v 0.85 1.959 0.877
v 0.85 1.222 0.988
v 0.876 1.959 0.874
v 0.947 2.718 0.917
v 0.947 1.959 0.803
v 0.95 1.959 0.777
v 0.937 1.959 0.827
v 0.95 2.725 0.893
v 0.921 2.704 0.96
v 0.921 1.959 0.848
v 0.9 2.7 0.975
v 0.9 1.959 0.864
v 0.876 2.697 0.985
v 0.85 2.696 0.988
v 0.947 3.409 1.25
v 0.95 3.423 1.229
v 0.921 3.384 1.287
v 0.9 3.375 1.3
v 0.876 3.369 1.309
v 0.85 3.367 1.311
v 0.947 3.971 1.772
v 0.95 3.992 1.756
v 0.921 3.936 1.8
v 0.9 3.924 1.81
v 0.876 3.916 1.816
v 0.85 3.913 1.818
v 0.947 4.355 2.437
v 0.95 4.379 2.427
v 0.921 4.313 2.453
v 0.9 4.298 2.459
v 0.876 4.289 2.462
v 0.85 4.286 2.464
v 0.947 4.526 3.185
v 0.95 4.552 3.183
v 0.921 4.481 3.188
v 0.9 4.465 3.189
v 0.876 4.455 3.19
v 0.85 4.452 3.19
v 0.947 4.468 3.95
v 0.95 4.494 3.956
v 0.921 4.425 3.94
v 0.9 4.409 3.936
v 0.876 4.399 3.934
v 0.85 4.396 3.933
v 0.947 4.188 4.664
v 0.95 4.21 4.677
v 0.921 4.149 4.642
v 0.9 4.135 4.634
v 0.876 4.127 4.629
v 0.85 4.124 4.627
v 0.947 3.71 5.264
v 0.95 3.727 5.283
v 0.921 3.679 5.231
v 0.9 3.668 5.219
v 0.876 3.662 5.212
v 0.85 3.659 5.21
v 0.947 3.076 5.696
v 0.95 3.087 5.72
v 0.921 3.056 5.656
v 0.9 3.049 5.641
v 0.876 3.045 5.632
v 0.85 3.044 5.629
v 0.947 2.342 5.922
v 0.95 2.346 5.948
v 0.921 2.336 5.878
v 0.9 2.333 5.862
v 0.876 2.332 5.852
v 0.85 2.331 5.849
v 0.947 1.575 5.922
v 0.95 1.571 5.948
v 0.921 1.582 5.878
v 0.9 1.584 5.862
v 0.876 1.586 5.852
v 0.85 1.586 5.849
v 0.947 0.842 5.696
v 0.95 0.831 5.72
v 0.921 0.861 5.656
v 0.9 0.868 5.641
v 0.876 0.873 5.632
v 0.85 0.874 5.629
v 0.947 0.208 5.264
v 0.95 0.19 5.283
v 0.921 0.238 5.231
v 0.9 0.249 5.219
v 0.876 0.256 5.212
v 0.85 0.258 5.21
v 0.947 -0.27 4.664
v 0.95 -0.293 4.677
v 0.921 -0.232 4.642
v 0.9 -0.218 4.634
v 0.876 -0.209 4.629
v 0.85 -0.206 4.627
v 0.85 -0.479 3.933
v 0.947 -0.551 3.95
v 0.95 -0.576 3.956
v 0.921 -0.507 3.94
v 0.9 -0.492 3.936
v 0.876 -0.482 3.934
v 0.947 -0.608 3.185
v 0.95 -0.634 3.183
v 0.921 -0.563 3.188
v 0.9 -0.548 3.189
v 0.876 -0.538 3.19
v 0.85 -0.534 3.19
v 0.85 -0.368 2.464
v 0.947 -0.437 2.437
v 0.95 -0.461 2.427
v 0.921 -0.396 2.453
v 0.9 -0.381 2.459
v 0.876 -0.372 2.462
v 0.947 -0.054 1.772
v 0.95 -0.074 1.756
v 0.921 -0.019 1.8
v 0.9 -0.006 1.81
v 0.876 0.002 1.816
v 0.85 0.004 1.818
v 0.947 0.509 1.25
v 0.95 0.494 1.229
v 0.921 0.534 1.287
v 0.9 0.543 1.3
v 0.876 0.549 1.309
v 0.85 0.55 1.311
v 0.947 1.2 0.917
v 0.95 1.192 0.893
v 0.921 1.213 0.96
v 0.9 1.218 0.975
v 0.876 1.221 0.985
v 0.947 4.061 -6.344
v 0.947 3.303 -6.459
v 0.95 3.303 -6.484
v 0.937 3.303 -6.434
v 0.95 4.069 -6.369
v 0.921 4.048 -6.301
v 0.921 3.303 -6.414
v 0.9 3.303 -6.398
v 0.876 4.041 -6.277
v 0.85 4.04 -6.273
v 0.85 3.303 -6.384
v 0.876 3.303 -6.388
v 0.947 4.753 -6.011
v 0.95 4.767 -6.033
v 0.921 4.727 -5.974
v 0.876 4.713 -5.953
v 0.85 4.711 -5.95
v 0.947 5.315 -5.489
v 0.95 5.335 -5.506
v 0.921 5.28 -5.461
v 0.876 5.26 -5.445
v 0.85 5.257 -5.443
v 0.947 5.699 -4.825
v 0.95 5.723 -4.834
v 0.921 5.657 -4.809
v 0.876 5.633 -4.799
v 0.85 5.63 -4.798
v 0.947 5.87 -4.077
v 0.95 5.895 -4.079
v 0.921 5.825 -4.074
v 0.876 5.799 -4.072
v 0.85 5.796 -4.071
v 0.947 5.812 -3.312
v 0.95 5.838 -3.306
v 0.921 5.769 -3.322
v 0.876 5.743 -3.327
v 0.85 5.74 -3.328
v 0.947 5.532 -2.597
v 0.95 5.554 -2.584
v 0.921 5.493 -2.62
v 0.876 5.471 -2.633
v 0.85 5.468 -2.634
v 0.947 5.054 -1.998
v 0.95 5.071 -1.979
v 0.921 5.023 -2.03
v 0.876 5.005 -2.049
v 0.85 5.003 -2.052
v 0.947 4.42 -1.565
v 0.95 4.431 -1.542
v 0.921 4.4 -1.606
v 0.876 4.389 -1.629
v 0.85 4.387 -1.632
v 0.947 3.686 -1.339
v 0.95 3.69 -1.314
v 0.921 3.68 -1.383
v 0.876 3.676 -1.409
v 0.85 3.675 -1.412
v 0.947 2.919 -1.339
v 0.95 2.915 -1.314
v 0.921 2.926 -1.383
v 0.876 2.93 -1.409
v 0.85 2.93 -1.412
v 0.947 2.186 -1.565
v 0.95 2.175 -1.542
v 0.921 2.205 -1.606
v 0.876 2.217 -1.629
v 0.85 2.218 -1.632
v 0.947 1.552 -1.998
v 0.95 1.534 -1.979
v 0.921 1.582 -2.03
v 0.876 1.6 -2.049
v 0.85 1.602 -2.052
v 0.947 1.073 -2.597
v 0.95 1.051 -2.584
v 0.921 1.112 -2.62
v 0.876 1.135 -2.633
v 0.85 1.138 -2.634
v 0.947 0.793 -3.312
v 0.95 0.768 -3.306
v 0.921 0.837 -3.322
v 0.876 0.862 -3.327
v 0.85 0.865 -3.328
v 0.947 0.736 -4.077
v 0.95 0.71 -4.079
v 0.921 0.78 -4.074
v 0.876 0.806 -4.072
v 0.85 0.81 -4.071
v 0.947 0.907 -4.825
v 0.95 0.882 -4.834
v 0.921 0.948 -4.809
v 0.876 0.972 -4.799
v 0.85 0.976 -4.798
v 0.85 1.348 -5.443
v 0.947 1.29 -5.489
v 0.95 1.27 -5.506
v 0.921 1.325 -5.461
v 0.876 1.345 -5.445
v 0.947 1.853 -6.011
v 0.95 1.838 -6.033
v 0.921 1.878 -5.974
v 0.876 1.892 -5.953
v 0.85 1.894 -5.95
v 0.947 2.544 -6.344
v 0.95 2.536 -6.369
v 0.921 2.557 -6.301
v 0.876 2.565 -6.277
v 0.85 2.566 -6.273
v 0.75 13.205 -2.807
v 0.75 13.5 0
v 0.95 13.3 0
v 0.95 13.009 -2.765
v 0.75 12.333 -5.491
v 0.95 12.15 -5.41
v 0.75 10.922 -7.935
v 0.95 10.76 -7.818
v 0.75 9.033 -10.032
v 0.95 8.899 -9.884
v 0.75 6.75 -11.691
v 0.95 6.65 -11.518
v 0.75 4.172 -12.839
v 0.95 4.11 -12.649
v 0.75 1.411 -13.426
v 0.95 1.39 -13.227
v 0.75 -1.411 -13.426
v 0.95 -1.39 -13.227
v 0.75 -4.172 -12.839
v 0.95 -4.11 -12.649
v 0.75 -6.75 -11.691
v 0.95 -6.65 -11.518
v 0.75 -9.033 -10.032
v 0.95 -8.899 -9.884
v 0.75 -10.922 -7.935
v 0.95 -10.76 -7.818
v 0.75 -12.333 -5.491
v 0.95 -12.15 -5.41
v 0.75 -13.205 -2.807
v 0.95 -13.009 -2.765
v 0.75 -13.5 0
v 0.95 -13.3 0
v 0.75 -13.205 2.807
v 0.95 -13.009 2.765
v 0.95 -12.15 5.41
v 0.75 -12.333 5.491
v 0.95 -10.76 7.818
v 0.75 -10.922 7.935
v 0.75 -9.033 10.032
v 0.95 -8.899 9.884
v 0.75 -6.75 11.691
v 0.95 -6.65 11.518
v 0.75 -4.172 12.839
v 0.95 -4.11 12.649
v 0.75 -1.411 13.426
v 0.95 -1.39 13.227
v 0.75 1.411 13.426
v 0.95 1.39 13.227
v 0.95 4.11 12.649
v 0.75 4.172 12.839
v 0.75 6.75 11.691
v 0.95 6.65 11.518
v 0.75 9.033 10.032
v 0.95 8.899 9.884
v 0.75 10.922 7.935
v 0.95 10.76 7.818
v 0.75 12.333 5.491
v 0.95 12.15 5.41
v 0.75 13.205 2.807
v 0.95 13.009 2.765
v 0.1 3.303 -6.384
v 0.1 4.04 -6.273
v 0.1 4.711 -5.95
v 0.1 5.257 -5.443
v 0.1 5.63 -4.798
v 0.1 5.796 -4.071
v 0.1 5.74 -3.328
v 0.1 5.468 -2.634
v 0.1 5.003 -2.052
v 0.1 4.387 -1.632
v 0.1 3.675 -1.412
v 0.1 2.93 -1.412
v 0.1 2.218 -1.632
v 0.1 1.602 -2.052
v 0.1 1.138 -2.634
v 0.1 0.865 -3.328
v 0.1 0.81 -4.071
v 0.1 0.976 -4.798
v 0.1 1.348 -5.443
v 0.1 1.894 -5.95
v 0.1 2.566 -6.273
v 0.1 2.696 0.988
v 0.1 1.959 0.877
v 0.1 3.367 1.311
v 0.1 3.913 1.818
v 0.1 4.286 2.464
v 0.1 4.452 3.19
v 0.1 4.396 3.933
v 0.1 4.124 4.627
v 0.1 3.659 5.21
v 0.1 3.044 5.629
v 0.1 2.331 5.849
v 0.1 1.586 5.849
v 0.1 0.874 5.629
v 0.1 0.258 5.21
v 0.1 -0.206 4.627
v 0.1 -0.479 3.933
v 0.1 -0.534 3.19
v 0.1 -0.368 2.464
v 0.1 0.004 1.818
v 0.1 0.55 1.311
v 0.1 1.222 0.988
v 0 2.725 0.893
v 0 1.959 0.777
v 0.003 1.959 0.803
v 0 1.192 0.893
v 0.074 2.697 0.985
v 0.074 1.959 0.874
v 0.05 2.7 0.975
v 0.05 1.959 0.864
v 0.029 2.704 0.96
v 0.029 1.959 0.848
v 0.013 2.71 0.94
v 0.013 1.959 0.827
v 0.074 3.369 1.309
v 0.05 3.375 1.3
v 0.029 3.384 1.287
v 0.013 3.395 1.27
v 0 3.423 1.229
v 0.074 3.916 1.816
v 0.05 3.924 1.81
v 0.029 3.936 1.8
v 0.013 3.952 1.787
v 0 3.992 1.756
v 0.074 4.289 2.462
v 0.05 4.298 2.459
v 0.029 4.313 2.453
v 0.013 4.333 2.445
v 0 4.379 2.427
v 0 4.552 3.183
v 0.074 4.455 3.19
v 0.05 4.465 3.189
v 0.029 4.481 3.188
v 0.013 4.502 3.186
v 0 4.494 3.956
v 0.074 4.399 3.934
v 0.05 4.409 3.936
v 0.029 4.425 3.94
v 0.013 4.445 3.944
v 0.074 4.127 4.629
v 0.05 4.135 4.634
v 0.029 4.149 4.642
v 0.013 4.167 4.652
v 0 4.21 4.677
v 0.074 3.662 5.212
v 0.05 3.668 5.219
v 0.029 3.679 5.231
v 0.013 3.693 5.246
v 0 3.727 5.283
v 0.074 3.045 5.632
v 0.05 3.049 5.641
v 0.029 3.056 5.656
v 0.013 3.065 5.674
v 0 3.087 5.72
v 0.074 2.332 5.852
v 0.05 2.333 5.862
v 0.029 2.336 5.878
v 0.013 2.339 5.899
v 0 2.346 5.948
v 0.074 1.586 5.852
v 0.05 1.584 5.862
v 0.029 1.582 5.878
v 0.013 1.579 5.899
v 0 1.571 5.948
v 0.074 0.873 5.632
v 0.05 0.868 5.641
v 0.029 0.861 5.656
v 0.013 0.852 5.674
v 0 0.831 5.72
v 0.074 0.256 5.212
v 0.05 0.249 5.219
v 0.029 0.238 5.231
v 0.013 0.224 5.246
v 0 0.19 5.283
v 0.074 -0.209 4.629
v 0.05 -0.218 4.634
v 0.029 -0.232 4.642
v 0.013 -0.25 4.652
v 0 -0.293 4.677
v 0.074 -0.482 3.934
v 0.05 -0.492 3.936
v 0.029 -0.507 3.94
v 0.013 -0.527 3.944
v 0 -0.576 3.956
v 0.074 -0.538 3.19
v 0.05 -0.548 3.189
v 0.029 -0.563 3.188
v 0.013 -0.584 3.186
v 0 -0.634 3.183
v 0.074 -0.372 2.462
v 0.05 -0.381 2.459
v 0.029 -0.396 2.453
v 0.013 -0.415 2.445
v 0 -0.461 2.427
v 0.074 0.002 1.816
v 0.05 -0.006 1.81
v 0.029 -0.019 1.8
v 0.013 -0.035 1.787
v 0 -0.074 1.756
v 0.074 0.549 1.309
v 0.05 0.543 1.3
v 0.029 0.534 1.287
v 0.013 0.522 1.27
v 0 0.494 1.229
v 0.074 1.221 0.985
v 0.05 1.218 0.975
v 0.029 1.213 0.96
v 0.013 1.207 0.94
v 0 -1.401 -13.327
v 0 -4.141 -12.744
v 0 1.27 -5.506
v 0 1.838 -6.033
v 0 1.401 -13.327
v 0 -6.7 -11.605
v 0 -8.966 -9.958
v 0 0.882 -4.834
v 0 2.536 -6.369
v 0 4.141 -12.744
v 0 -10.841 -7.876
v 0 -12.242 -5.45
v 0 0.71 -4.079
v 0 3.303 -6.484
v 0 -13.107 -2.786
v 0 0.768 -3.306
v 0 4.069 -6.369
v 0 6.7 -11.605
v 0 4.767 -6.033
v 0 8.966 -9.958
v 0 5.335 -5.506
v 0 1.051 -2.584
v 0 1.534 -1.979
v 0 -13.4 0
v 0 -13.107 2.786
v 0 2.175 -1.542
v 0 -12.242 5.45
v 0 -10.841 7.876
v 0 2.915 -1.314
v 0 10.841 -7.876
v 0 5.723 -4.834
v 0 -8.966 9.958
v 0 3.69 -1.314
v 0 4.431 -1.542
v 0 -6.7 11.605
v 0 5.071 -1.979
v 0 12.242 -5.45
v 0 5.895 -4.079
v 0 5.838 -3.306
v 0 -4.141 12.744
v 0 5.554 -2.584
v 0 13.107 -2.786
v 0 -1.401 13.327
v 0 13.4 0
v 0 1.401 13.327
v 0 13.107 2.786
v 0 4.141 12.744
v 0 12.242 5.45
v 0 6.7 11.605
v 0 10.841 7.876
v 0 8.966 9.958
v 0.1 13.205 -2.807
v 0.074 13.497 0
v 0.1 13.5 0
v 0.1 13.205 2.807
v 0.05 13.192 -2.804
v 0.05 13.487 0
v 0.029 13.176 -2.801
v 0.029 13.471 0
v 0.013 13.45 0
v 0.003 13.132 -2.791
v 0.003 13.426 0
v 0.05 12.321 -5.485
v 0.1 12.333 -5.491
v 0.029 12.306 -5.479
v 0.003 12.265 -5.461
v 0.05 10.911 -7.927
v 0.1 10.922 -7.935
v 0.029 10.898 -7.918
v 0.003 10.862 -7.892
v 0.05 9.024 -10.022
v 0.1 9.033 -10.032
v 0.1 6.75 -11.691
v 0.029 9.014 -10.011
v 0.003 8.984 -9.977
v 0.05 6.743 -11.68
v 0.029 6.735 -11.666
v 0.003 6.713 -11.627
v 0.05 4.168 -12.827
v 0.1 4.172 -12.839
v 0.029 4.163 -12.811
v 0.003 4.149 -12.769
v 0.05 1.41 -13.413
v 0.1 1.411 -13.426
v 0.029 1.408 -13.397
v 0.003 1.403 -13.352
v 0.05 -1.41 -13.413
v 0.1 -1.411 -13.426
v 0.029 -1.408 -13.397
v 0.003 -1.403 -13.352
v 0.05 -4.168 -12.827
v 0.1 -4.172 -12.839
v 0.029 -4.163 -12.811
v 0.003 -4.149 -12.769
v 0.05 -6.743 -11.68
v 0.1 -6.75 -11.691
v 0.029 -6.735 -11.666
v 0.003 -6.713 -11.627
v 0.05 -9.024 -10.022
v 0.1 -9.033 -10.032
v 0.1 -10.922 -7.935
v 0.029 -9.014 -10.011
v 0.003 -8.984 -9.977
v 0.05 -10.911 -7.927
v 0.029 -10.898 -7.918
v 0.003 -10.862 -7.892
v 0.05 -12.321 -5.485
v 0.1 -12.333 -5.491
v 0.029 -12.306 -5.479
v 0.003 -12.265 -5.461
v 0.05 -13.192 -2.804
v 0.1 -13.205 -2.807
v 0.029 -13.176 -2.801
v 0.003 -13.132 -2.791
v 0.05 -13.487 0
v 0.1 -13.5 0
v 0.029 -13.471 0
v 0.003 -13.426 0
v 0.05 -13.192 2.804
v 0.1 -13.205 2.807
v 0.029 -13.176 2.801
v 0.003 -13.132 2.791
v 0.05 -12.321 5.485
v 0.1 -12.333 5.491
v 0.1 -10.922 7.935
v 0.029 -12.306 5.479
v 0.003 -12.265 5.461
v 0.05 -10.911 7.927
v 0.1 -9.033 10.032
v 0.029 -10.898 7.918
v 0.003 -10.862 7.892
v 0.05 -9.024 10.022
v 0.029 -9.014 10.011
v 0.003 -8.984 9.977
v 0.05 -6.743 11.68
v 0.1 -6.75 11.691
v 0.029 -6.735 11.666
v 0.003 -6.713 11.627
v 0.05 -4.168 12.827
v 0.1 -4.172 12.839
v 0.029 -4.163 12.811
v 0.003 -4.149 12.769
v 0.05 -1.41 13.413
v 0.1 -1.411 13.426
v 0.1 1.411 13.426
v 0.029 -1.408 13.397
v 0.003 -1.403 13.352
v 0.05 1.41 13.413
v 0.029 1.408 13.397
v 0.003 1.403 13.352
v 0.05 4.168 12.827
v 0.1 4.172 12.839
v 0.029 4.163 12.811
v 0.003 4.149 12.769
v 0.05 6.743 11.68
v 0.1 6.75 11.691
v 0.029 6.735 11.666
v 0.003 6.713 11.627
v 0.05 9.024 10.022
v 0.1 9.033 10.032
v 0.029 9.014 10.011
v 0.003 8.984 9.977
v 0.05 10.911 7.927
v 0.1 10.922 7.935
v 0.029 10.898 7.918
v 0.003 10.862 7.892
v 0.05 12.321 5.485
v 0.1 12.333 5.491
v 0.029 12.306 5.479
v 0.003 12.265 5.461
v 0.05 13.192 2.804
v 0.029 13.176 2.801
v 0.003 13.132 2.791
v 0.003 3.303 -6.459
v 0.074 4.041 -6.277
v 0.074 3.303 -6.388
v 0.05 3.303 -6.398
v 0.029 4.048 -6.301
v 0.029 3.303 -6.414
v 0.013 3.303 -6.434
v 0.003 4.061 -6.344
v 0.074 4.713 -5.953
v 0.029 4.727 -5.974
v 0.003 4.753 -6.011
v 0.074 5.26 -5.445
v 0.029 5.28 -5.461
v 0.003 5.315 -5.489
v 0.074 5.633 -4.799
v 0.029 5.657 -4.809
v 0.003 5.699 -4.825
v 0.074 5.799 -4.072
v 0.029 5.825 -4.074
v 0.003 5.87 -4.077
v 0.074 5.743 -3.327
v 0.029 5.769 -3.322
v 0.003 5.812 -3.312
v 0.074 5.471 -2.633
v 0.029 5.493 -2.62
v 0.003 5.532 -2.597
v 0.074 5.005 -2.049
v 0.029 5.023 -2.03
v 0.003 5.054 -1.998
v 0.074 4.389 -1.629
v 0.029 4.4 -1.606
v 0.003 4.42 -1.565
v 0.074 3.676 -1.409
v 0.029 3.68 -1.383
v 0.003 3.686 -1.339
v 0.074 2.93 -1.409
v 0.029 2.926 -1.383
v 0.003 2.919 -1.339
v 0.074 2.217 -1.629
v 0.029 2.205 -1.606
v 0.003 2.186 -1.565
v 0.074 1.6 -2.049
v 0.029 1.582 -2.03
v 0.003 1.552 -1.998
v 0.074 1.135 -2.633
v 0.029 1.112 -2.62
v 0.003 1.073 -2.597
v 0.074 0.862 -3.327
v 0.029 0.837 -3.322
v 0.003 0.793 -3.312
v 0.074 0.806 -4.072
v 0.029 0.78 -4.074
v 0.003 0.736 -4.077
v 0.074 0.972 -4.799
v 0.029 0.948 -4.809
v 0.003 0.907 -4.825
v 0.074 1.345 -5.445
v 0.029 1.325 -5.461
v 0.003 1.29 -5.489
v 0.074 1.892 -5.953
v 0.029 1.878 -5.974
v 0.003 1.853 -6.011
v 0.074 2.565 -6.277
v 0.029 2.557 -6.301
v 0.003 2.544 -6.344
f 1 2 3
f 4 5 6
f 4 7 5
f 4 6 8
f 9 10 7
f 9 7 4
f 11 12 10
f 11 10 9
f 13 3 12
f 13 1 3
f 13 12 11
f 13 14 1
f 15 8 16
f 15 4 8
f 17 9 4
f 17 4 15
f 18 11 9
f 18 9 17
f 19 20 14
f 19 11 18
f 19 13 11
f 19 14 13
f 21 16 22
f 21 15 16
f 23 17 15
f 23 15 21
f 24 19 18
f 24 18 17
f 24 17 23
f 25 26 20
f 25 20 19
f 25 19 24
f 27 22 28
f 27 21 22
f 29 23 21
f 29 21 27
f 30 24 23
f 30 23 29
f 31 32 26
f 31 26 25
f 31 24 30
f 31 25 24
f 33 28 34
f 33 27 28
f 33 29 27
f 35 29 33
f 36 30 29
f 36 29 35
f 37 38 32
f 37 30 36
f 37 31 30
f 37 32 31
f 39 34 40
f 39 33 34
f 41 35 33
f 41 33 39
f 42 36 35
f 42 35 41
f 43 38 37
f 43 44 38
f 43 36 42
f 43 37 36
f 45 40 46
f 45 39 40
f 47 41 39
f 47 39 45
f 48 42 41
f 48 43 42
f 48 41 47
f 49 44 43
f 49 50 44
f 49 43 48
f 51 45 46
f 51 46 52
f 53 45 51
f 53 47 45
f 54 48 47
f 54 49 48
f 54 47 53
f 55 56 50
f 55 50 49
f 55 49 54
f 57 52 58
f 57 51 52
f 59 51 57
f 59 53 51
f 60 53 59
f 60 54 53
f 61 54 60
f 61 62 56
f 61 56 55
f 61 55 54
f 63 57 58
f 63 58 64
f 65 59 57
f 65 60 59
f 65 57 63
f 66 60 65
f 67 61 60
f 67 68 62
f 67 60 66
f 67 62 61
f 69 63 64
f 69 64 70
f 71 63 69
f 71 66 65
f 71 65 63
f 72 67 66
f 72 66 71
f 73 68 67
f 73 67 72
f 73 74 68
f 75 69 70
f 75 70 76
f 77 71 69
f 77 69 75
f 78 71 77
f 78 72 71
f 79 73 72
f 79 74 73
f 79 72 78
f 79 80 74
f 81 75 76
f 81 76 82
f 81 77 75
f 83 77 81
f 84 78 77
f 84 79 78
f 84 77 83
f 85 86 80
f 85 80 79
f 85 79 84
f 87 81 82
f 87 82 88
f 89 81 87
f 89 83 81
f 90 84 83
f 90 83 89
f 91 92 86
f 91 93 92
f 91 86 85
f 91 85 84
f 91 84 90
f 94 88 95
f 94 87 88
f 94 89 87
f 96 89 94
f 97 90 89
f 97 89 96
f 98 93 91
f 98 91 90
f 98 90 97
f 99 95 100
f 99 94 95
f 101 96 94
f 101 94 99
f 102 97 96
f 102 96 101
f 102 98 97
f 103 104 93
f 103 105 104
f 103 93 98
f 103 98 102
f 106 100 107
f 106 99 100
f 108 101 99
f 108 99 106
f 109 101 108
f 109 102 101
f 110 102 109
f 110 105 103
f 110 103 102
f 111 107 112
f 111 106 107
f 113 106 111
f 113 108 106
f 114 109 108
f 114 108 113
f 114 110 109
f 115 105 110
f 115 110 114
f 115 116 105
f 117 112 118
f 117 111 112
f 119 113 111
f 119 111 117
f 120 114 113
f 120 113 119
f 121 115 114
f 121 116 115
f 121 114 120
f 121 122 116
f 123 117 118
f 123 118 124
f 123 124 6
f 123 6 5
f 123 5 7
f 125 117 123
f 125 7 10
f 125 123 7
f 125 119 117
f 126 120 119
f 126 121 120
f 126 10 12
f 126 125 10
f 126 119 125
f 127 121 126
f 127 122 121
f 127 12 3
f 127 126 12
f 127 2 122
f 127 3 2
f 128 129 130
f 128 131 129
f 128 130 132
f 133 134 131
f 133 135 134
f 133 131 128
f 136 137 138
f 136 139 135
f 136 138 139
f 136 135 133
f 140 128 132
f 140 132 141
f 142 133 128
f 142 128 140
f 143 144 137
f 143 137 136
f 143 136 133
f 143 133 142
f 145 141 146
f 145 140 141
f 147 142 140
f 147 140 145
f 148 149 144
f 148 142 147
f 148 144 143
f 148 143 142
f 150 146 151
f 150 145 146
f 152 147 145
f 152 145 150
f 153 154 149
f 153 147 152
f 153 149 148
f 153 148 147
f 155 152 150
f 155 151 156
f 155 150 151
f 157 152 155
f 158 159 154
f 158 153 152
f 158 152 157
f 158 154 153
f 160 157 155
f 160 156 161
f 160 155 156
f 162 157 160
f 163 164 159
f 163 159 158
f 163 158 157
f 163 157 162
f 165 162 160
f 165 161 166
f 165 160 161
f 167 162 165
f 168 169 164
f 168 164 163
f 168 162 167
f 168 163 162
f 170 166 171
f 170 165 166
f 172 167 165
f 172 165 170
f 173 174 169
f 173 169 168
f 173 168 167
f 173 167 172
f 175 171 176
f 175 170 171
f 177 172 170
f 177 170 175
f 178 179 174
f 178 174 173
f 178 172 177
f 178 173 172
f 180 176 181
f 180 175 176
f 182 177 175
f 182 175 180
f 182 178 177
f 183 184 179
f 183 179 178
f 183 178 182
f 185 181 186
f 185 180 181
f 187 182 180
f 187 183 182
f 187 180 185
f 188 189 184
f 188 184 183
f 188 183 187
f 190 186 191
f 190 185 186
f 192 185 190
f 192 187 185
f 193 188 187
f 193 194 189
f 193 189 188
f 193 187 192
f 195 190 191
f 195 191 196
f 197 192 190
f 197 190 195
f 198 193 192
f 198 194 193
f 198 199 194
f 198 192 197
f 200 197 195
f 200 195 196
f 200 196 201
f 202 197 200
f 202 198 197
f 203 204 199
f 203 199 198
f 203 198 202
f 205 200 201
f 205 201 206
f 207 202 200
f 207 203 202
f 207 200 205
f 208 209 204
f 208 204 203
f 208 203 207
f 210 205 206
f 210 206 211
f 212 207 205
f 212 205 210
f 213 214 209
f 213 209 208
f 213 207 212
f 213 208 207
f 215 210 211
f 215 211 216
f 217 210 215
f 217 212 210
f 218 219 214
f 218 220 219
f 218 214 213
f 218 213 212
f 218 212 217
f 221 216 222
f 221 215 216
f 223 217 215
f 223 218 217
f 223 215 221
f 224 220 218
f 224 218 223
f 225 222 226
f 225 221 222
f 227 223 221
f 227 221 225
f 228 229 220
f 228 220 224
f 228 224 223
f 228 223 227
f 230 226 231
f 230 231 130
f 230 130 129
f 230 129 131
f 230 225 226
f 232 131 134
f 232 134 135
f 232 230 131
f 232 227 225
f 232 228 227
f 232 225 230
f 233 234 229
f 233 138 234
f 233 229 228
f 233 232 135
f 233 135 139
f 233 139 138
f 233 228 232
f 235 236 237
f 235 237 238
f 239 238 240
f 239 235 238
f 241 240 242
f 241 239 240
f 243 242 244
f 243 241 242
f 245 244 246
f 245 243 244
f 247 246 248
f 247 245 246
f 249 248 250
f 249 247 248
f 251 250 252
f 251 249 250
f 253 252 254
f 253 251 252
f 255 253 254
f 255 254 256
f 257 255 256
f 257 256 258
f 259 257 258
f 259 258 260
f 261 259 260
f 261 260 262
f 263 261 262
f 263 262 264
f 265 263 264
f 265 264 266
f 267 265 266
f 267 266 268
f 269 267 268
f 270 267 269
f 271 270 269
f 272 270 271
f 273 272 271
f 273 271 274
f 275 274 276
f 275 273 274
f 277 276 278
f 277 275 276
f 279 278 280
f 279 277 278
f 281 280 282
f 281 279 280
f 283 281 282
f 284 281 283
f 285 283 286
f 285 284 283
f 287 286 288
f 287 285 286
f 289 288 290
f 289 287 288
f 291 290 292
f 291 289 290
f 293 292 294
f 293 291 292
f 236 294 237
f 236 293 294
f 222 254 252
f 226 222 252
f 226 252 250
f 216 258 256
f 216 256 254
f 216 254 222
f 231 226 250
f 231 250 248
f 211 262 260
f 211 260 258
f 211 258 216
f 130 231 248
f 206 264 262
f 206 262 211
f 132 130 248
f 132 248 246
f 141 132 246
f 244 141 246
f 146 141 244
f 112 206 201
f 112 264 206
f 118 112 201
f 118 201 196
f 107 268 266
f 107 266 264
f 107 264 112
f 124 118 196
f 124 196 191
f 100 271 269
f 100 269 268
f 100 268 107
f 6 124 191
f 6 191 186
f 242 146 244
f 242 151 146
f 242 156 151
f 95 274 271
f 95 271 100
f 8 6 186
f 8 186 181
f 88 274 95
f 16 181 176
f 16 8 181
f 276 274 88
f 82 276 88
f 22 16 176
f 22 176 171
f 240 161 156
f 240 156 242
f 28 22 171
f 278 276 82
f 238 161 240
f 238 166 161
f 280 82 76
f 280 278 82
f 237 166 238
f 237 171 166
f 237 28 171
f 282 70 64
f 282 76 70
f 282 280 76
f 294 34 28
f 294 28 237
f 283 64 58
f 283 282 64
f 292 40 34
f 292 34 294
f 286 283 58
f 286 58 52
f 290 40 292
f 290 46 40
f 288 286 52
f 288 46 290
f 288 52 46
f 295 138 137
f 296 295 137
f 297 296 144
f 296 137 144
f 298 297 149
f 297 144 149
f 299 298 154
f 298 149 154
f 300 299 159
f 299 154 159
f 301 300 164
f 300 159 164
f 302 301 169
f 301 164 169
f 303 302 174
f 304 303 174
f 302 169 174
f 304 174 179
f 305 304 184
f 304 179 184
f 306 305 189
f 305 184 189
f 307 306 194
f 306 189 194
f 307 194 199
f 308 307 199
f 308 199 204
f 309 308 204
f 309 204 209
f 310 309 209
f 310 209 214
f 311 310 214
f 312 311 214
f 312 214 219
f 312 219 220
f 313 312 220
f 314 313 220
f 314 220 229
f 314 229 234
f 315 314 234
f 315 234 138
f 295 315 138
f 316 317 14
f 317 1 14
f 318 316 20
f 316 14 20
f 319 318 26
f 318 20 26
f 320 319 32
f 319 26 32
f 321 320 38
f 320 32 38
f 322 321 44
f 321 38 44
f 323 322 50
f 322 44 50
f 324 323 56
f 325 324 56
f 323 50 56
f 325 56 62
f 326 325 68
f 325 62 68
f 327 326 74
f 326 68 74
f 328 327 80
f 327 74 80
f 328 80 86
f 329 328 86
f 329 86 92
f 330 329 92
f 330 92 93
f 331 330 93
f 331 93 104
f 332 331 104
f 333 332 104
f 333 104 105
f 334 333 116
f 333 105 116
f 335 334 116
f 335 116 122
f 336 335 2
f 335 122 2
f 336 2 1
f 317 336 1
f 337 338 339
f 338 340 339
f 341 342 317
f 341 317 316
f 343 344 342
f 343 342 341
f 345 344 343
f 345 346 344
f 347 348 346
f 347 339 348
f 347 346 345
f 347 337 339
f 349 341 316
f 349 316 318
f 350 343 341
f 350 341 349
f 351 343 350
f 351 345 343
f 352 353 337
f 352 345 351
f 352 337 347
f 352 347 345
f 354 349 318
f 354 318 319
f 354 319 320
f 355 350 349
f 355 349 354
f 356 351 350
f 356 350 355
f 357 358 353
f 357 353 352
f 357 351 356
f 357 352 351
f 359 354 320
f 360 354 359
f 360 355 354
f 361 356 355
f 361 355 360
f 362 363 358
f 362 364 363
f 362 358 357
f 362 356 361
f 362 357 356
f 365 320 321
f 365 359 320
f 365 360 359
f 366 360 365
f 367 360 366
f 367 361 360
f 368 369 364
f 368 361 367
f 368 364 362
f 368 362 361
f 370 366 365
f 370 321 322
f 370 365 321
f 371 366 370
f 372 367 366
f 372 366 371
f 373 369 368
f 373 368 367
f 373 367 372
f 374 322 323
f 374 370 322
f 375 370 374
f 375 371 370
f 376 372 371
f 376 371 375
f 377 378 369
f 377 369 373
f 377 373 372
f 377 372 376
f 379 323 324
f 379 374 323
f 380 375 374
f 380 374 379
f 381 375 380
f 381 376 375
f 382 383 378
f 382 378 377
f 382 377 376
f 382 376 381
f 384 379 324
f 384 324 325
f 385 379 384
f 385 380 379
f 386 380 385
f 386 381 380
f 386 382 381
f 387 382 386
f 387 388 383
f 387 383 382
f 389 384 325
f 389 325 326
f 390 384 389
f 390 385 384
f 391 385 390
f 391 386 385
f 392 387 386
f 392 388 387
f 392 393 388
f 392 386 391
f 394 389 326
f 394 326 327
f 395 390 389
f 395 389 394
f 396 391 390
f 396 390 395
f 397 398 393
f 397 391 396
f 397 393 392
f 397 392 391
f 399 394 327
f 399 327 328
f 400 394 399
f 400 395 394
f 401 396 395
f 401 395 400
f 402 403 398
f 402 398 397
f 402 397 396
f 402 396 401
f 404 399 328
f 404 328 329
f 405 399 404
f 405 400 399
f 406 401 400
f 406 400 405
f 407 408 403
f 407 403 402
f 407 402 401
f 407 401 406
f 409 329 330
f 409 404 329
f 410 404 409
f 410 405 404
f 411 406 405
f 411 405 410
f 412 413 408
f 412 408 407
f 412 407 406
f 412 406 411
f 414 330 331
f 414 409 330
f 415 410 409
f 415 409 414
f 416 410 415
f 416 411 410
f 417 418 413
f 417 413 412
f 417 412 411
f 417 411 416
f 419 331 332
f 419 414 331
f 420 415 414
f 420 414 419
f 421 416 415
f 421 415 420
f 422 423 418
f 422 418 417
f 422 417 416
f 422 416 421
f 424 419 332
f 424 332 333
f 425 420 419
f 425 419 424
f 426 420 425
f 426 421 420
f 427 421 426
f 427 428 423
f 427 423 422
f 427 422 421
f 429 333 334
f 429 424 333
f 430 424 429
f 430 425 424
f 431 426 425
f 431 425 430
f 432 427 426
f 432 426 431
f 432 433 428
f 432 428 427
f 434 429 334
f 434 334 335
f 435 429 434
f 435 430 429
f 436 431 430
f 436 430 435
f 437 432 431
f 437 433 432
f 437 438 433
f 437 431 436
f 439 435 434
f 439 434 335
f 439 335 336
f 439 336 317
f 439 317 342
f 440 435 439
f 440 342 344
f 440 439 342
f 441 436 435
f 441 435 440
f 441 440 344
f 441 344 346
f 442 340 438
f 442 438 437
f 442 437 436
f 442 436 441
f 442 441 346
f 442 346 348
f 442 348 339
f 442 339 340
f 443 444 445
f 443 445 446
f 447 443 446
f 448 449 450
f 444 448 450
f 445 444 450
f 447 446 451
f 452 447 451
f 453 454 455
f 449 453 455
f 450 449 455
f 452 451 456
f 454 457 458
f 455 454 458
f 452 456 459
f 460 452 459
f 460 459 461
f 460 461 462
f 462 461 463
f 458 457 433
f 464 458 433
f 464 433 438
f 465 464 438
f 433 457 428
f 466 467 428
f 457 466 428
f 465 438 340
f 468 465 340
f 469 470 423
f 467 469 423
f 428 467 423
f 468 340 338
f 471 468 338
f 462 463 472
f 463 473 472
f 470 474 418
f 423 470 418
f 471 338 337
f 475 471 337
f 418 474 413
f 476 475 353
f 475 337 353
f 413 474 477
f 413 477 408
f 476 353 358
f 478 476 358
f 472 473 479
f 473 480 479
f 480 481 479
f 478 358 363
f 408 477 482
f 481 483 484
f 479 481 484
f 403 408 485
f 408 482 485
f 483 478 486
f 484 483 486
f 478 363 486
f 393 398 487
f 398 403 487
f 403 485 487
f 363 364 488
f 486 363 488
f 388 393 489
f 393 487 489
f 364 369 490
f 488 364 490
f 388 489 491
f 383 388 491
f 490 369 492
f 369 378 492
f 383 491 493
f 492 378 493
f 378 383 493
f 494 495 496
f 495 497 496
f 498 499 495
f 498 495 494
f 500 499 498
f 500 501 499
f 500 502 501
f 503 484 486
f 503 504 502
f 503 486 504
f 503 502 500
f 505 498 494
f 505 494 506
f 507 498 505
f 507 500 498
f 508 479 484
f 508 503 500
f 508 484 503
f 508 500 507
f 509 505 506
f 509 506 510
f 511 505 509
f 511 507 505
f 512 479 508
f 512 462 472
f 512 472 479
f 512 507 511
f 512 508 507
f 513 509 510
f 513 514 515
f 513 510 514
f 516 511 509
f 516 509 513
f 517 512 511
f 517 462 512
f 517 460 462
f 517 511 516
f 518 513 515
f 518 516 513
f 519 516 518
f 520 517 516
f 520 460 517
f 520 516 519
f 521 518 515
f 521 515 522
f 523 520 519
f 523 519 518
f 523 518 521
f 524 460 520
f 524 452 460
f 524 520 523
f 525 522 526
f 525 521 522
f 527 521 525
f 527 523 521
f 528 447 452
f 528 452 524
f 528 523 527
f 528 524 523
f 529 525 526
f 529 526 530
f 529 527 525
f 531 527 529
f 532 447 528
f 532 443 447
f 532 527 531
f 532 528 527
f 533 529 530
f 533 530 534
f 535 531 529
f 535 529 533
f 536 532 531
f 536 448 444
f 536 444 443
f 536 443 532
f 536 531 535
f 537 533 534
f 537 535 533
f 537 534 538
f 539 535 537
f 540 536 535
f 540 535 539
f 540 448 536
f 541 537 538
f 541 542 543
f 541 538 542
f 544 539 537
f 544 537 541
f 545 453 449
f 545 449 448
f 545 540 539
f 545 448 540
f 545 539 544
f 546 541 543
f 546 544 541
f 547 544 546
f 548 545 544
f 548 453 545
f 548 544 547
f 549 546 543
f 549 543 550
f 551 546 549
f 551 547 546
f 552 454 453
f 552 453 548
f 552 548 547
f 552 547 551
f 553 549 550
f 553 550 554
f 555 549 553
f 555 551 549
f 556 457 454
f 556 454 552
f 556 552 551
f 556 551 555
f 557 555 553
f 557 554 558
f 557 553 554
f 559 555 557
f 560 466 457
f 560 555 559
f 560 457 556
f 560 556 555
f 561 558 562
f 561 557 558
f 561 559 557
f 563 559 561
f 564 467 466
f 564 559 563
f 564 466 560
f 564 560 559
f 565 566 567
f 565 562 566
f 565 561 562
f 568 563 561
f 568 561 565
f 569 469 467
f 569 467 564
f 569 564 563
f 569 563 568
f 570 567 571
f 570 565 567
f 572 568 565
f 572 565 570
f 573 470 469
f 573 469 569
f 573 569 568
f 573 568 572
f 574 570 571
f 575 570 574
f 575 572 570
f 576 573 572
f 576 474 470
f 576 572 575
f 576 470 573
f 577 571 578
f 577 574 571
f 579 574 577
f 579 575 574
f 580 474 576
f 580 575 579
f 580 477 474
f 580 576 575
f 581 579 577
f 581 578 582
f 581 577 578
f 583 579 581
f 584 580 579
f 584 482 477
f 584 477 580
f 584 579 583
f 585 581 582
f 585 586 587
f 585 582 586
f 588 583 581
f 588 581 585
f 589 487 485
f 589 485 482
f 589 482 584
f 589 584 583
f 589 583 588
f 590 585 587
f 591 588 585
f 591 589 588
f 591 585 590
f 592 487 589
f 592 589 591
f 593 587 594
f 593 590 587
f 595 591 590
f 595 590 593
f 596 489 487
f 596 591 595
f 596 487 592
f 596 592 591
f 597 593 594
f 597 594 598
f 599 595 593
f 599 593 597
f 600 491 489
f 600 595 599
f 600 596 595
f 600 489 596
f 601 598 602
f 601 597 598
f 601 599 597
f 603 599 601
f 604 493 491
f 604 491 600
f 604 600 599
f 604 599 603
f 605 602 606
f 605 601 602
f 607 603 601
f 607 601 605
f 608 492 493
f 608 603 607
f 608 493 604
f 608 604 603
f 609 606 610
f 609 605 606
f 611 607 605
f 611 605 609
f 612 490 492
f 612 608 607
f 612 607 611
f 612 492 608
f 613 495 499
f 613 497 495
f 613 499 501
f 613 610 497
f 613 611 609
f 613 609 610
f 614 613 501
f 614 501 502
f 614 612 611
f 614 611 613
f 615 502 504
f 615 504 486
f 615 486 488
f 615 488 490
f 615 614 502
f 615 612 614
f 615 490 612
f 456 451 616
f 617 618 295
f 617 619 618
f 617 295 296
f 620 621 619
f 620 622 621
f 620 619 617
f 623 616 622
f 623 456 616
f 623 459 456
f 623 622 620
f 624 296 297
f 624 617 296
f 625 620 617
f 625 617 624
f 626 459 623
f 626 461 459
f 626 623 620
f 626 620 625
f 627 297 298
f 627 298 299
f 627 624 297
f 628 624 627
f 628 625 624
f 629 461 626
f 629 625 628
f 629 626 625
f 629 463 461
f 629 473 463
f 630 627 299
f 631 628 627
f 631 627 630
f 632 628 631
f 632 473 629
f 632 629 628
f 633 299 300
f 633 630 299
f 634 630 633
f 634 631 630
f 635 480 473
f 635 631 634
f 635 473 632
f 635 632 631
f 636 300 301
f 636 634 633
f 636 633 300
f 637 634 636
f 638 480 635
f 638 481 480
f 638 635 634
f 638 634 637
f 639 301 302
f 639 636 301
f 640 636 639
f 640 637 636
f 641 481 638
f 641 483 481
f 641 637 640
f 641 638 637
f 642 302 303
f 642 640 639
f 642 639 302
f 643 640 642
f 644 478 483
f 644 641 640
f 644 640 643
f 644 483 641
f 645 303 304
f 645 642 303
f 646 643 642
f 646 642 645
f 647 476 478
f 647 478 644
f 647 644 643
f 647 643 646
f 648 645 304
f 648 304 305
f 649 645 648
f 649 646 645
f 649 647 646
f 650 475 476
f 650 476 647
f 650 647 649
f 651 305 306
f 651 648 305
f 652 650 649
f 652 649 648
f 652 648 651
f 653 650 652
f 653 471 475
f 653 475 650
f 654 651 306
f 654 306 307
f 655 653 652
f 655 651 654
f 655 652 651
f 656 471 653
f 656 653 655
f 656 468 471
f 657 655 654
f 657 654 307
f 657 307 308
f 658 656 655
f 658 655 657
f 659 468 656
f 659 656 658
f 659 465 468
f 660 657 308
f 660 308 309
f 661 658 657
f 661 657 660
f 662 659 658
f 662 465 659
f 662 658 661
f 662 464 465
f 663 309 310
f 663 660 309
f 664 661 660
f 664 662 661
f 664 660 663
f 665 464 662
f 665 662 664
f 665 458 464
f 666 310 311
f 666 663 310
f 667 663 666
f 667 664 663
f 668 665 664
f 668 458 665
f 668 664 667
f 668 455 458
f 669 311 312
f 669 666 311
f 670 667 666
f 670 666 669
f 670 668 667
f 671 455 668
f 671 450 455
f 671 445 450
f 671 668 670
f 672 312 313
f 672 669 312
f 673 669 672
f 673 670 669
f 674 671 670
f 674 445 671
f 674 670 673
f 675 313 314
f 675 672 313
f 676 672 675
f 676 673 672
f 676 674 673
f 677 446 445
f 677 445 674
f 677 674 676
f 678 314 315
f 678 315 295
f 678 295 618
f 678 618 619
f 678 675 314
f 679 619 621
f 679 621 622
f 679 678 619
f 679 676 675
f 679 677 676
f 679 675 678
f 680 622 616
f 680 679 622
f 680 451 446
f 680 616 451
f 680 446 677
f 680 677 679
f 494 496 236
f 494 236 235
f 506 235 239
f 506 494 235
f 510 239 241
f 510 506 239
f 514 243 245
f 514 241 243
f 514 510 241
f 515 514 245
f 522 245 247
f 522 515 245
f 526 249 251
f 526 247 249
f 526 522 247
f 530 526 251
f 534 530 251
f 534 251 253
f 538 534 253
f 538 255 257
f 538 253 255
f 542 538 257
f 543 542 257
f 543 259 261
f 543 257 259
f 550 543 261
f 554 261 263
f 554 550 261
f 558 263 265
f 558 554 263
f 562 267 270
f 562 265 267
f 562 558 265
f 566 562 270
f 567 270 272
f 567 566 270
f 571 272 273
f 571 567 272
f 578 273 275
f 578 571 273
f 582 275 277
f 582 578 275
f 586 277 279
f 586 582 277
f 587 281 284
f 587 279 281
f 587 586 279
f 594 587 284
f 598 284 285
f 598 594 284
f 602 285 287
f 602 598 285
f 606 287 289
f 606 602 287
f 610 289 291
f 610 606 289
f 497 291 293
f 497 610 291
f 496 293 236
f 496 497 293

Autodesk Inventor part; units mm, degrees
ref_plane "YZ Plane" through (0, 0, 0) normal (1, 0, 0) x (0, 1, 0)
ref_plane "XZ Plane" through (0, 0, 0) normal (0, 1, 0) x (-1, 0, 0)
ref_plane "XY Plane" through (0, 0, 0) normal (0, 0, 1) x (1, 0, 0)
sketch "Sketch1" plane through (0, 0, 0) normal (1, 0, 0) x (0, 1, 0)
  circle A0 centre (1.9588, 3.377) radius 2.2698
  circle A1 centre (1.9588, 3.377) radius 2.2698
  line L0 (1.9588, 3.377) -> (1.9588, 0)
  line L1 (1.9588, 0) -> (0, 0)
  line L2 (0, 0) -> (0, 3.377)
  line L3 (0, 3.377) -> (1.9588, 3.377)
  circle A2 centre (3.3027, -3.8845) radius 2.2698
  line L4 (0, 0) -> (0, -3.8845)
  line L5 (0, -3.8845) -> (3.3027, -3.8845)
  line L6 (3.3027, -3.8845) -> (3.3027, 0)
  line L7 (3.3027, 0) -> (0, 0)
  circle A3 centre (0, 0) radius 13.5
  dimension "d0" = 4.5396
  dimension "d1" = 3.377
  dimension "d2" = 1.9588
  dimension "d3" = 3.8845
  dimension "d4" = 3.3026
  dimension "d5" = 4.5396
  dimension "d6" = 27
extrude "Extrusion1" add sketch "Sketch1" along normal blind 0.95 contours A0 L0 L1 L2 | L1 L7 L6 A2 L5 L4 | A3
sketch "Sketch2" plane through (0.95, 0, 0) normal (1, 0, 0) x (0, 0, -1)
  circle A0 centre (-3.377, 1.9588) radius 2.2698 projected
  circle A1 centre (-3.377, 1.9588) radius 2.5
  circle A2 centre (3.8845, 3.3027) radius 2.2698 projected
  circle A3 centre (3.8845, 3.3027) radius 2.5
  point P0 (0, 0)
  dimension "d9" = 5
  dimension "d10" = 5
extrude "Extrusion2" cut sketch "Sketch2" against normal blind 0.95 contours A0 | A1 | A2 | A3
fillet "Fillet1" radius 0.1 5 edges at (0.95, 1.9588, 5.877) (0.95, 3.3027, -1.3845) (0, 3.3027, -1.3845) (0, 1.9588, 5.877) (0, -13.5, 0)
chamfer "Chamfer1" distance 0.2 angle 45 1 edges at (0.95, -13.5, 0)
properties part number "PlateGantryMountSymbolDisc"
